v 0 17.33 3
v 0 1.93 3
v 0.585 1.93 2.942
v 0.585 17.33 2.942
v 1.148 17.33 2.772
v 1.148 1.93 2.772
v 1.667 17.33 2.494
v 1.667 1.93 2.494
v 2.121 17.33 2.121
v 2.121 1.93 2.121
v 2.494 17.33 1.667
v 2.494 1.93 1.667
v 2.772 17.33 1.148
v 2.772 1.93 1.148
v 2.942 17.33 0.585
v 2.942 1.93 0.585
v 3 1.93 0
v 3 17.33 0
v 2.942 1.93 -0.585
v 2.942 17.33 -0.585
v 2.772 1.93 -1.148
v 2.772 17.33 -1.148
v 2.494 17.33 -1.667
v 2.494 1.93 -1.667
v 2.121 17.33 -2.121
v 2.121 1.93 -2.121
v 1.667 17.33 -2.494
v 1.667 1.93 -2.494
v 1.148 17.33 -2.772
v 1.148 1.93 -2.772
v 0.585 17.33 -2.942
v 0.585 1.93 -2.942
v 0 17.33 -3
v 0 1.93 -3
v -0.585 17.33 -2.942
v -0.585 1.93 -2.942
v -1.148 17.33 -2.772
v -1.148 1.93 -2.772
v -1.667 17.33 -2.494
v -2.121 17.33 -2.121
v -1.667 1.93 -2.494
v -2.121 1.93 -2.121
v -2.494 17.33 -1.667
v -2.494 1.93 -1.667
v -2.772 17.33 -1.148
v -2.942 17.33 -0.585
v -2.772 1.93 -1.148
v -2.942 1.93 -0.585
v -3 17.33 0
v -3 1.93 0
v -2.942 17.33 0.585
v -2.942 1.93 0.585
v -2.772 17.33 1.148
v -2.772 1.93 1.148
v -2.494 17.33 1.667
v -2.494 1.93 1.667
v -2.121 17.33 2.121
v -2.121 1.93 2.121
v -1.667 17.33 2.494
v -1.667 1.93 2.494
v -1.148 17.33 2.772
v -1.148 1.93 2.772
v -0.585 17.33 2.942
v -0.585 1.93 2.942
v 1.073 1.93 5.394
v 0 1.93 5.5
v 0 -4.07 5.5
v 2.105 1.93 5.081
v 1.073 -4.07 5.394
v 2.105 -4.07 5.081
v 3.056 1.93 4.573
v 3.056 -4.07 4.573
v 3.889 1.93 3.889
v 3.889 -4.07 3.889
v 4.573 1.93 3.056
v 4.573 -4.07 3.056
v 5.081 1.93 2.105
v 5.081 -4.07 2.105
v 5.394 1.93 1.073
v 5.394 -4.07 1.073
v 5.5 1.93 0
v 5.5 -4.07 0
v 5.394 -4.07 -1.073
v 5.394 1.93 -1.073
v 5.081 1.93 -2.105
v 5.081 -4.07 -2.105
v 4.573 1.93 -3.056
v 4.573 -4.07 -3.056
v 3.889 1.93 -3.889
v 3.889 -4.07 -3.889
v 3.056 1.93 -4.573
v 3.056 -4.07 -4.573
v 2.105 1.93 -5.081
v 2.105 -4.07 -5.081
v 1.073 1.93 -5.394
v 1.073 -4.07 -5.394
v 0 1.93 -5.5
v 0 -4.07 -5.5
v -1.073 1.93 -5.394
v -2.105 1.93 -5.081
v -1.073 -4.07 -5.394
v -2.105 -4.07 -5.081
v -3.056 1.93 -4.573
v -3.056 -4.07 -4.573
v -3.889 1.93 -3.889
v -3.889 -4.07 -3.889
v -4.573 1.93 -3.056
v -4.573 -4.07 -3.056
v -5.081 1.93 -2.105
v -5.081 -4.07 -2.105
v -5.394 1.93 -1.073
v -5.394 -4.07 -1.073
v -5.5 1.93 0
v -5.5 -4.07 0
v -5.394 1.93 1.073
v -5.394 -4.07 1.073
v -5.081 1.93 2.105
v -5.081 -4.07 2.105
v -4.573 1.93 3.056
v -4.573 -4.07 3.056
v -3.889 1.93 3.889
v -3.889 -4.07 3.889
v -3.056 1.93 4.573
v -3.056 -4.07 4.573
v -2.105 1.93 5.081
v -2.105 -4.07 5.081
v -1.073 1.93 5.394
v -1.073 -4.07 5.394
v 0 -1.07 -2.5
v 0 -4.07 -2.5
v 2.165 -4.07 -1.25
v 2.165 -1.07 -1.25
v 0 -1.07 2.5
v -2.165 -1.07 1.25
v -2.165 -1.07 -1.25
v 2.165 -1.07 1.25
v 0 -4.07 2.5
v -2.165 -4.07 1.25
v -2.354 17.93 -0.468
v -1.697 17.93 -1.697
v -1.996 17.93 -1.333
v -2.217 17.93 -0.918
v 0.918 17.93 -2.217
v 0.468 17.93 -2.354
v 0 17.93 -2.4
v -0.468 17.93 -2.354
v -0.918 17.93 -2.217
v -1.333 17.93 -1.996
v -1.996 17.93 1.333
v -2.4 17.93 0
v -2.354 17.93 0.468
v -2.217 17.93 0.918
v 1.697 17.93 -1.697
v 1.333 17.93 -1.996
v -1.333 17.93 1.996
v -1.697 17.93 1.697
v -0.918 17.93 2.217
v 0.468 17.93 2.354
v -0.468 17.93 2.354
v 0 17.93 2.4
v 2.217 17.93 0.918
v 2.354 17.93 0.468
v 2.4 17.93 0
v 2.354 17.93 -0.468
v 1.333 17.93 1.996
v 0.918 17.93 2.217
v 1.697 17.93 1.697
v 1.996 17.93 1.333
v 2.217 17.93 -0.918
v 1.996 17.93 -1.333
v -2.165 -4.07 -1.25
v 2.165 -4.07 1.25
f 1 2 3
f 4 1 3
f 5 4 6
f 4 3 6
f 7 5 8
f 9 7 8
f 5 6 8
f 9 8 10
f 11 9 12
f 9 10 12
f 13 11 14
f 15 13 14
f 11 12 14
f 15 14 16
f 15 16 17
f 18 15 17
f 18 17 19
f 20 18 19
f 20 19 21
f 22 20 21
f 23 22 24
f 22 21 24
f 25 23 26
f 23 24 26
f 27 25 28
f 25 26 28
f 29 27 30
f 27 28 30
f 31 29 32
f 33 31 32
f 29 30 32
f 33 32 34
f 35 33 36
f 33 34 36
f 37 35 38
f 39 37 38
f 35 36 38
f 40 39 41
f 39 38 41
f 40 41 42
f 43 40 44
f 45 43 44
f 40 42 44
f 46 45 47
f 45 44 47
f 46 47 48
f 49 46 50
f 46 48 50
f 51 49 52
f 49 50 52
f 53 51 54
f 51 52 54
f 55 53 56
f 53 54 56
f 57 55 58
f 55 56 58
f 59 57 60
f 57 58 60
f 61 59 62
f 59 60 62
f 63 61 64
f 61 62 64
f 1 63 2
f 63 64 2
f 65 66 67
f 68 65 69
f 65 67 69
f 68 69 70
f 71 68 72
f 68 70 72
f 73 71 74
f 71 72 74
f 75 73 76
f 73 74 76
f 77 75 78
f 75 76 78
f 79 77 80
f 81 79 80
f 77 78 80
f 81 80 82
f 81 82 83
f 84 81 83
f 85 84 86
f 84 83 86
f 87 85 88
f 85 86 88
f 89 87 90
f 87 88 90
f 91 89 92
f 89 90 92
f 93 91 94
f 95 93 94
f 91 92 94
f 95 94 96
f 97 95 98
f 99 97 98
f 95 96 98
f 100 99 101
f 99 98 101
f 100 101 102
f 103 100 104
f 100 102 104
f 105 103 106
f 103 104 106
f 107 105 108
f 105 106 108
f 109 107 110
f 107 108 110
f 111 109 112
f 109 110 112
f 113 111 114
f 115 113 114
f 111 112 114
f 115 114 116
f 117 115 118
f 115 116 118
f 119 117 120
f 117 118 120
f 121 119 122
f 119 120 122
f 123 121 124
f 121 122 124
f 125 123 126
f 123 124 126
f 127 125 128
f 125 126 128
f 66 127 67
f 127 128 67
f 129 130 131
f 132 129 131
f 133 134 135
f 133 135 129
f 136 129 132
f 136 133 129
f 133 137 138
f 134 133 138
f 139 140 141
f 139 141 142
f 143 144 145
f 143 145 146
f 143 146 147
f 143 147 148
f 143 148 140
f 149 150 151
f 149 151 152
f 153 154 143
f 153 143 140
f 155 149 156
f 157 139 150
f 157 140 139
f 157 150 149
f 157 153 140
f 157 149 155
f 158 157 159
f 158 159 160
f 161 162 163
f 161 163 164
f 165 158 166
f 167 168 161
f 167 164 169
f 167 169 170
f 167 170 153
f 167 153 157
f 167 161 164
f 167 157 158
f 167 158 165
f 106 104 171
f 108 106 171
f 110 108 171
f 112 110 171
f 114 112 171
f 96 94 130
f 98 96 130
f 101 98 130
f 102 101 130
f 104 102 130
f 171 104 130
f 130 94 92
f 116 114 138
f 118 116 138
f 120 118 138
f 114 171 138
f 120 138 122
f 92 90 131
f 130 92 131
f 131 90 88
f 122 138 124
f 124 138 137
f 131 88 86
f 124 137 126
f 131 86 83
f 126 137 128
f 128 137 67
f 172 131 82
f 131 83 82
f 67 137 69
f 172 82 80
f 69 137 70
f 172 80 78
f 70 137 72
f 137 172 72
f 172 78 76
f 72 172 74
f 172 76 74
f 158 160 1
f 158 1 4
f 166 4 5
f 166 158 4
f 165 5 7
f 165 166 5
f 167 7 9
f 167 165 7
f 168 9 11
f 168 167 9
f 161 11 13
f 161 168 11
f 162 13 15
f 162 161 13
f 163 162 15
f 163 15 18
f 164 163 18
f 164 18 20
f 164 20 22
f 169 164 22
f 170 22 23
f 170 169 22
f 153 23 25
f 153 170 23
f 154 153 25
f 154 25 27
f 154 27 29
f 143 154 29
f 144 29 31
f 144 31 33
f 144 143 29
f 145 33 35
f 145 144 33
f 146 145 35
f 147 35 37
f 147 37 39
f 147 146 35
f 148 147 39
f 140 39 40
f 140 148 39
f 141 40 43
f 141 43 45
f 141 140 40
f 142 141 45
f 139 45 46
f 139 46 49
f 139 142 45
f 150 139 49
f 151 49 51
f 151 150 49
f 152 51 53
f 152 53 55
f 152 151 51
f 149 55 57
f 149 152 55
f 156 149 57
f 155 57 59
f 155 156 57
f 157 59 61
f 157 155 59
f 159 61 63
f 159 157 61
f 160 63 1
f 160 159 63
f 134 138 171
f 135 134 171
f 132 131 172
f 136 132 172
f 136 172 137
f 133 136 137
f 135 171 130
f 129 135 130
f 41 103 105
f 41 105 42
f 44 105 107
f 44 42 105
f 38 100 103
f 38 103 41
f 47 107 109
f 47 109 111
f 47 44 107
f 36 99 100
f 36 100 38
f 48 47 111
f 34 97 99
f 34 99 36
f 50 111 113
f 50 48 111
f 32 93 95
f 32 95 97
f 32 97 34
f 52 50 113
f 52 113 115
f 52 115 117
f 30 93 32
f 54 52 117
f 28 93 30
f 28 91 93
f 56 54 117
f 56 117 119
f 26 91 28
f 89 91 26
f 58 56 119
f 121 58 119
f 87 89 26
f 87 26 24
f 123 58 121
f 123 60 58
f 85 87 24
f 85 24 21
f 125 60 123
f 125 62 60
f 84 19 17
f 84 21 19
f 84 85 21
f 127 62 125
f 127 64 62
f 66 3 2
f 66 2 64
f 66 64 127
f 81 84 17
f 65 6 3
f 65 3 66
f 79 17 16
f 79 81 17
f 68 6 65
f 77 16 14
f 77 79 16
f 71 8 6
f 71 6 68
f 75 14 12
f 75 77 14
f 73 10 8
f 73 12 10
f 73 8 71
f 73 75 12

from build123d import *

# Parameters (mm, degrees)
SKETCH_1_R          = 2.75
EXTRUDE_1_DEPTH     = 3
CUT_EXTRUDE_1_DEPTH = 1.5
SKETCH_2_R          = 1.5
EXTRUDE_2_DEPTH     = 8
CHAMFER_1_SIZE      = 0.3
SCALE_1_SCALE       = 2


with BuildPart() as part:
    # 草图1 → 凸台-拉伸1 (new body)
    with BuildSketch(Plane(origin=(0, 0, 0), x_dir=(1, 0, 0), z_dir=(0, 1, 0))):
        with Locations(Location((0, 0, 0), (0, 0, 270))):
            Circle(SKETCH_1_R)
    extrude(amount=EXTRUDE_1_DEPTH)

    # 草图3 → 切除-拉伸1 (cut)
    with BuildSketch(Plane.XZ):
        Polygon((0, 1.25), (-1.082531755, 0.625), (-1.082531755, -0.625), (0, -1.25), (1.082531755, -0.625), (1.082531755, 0.625), align=None)
    extrude(amount=-CUT_EXTRUDE_1_DEPTH, mode=Mode.SUBTRACT)

    # 草图2 → 凸台-拉伸2 (add)
    with BuildSketch(Plane(origin=(0, 3, 0), x_dir=(1, 0, 0), z_dir=(0, 1, 0))):
        with Locations(Location((0, 0, 0), (0, 0, 270))):
            Circle(SKETCH_2_R)
    extrude(amount=EXTRUDE_2_DEPTH)

    # 倒角1
    chamfer_1_edges = [part.edges().sort_by_distance(p)[0] for p in [
        (0, 11, -1.5),
    ]]
    chamfer(chamfer_1_edges, length=CHAMFER_1_SIZE)


with BuildPart() as part_1:
    # 缩放比例1: scaled about (0, 4.07020226, 0)
    add(part.part.scale(SCALE_1_SCALE).moved(Location((0, -4.07020226, 0))))


solid = part_1.part
